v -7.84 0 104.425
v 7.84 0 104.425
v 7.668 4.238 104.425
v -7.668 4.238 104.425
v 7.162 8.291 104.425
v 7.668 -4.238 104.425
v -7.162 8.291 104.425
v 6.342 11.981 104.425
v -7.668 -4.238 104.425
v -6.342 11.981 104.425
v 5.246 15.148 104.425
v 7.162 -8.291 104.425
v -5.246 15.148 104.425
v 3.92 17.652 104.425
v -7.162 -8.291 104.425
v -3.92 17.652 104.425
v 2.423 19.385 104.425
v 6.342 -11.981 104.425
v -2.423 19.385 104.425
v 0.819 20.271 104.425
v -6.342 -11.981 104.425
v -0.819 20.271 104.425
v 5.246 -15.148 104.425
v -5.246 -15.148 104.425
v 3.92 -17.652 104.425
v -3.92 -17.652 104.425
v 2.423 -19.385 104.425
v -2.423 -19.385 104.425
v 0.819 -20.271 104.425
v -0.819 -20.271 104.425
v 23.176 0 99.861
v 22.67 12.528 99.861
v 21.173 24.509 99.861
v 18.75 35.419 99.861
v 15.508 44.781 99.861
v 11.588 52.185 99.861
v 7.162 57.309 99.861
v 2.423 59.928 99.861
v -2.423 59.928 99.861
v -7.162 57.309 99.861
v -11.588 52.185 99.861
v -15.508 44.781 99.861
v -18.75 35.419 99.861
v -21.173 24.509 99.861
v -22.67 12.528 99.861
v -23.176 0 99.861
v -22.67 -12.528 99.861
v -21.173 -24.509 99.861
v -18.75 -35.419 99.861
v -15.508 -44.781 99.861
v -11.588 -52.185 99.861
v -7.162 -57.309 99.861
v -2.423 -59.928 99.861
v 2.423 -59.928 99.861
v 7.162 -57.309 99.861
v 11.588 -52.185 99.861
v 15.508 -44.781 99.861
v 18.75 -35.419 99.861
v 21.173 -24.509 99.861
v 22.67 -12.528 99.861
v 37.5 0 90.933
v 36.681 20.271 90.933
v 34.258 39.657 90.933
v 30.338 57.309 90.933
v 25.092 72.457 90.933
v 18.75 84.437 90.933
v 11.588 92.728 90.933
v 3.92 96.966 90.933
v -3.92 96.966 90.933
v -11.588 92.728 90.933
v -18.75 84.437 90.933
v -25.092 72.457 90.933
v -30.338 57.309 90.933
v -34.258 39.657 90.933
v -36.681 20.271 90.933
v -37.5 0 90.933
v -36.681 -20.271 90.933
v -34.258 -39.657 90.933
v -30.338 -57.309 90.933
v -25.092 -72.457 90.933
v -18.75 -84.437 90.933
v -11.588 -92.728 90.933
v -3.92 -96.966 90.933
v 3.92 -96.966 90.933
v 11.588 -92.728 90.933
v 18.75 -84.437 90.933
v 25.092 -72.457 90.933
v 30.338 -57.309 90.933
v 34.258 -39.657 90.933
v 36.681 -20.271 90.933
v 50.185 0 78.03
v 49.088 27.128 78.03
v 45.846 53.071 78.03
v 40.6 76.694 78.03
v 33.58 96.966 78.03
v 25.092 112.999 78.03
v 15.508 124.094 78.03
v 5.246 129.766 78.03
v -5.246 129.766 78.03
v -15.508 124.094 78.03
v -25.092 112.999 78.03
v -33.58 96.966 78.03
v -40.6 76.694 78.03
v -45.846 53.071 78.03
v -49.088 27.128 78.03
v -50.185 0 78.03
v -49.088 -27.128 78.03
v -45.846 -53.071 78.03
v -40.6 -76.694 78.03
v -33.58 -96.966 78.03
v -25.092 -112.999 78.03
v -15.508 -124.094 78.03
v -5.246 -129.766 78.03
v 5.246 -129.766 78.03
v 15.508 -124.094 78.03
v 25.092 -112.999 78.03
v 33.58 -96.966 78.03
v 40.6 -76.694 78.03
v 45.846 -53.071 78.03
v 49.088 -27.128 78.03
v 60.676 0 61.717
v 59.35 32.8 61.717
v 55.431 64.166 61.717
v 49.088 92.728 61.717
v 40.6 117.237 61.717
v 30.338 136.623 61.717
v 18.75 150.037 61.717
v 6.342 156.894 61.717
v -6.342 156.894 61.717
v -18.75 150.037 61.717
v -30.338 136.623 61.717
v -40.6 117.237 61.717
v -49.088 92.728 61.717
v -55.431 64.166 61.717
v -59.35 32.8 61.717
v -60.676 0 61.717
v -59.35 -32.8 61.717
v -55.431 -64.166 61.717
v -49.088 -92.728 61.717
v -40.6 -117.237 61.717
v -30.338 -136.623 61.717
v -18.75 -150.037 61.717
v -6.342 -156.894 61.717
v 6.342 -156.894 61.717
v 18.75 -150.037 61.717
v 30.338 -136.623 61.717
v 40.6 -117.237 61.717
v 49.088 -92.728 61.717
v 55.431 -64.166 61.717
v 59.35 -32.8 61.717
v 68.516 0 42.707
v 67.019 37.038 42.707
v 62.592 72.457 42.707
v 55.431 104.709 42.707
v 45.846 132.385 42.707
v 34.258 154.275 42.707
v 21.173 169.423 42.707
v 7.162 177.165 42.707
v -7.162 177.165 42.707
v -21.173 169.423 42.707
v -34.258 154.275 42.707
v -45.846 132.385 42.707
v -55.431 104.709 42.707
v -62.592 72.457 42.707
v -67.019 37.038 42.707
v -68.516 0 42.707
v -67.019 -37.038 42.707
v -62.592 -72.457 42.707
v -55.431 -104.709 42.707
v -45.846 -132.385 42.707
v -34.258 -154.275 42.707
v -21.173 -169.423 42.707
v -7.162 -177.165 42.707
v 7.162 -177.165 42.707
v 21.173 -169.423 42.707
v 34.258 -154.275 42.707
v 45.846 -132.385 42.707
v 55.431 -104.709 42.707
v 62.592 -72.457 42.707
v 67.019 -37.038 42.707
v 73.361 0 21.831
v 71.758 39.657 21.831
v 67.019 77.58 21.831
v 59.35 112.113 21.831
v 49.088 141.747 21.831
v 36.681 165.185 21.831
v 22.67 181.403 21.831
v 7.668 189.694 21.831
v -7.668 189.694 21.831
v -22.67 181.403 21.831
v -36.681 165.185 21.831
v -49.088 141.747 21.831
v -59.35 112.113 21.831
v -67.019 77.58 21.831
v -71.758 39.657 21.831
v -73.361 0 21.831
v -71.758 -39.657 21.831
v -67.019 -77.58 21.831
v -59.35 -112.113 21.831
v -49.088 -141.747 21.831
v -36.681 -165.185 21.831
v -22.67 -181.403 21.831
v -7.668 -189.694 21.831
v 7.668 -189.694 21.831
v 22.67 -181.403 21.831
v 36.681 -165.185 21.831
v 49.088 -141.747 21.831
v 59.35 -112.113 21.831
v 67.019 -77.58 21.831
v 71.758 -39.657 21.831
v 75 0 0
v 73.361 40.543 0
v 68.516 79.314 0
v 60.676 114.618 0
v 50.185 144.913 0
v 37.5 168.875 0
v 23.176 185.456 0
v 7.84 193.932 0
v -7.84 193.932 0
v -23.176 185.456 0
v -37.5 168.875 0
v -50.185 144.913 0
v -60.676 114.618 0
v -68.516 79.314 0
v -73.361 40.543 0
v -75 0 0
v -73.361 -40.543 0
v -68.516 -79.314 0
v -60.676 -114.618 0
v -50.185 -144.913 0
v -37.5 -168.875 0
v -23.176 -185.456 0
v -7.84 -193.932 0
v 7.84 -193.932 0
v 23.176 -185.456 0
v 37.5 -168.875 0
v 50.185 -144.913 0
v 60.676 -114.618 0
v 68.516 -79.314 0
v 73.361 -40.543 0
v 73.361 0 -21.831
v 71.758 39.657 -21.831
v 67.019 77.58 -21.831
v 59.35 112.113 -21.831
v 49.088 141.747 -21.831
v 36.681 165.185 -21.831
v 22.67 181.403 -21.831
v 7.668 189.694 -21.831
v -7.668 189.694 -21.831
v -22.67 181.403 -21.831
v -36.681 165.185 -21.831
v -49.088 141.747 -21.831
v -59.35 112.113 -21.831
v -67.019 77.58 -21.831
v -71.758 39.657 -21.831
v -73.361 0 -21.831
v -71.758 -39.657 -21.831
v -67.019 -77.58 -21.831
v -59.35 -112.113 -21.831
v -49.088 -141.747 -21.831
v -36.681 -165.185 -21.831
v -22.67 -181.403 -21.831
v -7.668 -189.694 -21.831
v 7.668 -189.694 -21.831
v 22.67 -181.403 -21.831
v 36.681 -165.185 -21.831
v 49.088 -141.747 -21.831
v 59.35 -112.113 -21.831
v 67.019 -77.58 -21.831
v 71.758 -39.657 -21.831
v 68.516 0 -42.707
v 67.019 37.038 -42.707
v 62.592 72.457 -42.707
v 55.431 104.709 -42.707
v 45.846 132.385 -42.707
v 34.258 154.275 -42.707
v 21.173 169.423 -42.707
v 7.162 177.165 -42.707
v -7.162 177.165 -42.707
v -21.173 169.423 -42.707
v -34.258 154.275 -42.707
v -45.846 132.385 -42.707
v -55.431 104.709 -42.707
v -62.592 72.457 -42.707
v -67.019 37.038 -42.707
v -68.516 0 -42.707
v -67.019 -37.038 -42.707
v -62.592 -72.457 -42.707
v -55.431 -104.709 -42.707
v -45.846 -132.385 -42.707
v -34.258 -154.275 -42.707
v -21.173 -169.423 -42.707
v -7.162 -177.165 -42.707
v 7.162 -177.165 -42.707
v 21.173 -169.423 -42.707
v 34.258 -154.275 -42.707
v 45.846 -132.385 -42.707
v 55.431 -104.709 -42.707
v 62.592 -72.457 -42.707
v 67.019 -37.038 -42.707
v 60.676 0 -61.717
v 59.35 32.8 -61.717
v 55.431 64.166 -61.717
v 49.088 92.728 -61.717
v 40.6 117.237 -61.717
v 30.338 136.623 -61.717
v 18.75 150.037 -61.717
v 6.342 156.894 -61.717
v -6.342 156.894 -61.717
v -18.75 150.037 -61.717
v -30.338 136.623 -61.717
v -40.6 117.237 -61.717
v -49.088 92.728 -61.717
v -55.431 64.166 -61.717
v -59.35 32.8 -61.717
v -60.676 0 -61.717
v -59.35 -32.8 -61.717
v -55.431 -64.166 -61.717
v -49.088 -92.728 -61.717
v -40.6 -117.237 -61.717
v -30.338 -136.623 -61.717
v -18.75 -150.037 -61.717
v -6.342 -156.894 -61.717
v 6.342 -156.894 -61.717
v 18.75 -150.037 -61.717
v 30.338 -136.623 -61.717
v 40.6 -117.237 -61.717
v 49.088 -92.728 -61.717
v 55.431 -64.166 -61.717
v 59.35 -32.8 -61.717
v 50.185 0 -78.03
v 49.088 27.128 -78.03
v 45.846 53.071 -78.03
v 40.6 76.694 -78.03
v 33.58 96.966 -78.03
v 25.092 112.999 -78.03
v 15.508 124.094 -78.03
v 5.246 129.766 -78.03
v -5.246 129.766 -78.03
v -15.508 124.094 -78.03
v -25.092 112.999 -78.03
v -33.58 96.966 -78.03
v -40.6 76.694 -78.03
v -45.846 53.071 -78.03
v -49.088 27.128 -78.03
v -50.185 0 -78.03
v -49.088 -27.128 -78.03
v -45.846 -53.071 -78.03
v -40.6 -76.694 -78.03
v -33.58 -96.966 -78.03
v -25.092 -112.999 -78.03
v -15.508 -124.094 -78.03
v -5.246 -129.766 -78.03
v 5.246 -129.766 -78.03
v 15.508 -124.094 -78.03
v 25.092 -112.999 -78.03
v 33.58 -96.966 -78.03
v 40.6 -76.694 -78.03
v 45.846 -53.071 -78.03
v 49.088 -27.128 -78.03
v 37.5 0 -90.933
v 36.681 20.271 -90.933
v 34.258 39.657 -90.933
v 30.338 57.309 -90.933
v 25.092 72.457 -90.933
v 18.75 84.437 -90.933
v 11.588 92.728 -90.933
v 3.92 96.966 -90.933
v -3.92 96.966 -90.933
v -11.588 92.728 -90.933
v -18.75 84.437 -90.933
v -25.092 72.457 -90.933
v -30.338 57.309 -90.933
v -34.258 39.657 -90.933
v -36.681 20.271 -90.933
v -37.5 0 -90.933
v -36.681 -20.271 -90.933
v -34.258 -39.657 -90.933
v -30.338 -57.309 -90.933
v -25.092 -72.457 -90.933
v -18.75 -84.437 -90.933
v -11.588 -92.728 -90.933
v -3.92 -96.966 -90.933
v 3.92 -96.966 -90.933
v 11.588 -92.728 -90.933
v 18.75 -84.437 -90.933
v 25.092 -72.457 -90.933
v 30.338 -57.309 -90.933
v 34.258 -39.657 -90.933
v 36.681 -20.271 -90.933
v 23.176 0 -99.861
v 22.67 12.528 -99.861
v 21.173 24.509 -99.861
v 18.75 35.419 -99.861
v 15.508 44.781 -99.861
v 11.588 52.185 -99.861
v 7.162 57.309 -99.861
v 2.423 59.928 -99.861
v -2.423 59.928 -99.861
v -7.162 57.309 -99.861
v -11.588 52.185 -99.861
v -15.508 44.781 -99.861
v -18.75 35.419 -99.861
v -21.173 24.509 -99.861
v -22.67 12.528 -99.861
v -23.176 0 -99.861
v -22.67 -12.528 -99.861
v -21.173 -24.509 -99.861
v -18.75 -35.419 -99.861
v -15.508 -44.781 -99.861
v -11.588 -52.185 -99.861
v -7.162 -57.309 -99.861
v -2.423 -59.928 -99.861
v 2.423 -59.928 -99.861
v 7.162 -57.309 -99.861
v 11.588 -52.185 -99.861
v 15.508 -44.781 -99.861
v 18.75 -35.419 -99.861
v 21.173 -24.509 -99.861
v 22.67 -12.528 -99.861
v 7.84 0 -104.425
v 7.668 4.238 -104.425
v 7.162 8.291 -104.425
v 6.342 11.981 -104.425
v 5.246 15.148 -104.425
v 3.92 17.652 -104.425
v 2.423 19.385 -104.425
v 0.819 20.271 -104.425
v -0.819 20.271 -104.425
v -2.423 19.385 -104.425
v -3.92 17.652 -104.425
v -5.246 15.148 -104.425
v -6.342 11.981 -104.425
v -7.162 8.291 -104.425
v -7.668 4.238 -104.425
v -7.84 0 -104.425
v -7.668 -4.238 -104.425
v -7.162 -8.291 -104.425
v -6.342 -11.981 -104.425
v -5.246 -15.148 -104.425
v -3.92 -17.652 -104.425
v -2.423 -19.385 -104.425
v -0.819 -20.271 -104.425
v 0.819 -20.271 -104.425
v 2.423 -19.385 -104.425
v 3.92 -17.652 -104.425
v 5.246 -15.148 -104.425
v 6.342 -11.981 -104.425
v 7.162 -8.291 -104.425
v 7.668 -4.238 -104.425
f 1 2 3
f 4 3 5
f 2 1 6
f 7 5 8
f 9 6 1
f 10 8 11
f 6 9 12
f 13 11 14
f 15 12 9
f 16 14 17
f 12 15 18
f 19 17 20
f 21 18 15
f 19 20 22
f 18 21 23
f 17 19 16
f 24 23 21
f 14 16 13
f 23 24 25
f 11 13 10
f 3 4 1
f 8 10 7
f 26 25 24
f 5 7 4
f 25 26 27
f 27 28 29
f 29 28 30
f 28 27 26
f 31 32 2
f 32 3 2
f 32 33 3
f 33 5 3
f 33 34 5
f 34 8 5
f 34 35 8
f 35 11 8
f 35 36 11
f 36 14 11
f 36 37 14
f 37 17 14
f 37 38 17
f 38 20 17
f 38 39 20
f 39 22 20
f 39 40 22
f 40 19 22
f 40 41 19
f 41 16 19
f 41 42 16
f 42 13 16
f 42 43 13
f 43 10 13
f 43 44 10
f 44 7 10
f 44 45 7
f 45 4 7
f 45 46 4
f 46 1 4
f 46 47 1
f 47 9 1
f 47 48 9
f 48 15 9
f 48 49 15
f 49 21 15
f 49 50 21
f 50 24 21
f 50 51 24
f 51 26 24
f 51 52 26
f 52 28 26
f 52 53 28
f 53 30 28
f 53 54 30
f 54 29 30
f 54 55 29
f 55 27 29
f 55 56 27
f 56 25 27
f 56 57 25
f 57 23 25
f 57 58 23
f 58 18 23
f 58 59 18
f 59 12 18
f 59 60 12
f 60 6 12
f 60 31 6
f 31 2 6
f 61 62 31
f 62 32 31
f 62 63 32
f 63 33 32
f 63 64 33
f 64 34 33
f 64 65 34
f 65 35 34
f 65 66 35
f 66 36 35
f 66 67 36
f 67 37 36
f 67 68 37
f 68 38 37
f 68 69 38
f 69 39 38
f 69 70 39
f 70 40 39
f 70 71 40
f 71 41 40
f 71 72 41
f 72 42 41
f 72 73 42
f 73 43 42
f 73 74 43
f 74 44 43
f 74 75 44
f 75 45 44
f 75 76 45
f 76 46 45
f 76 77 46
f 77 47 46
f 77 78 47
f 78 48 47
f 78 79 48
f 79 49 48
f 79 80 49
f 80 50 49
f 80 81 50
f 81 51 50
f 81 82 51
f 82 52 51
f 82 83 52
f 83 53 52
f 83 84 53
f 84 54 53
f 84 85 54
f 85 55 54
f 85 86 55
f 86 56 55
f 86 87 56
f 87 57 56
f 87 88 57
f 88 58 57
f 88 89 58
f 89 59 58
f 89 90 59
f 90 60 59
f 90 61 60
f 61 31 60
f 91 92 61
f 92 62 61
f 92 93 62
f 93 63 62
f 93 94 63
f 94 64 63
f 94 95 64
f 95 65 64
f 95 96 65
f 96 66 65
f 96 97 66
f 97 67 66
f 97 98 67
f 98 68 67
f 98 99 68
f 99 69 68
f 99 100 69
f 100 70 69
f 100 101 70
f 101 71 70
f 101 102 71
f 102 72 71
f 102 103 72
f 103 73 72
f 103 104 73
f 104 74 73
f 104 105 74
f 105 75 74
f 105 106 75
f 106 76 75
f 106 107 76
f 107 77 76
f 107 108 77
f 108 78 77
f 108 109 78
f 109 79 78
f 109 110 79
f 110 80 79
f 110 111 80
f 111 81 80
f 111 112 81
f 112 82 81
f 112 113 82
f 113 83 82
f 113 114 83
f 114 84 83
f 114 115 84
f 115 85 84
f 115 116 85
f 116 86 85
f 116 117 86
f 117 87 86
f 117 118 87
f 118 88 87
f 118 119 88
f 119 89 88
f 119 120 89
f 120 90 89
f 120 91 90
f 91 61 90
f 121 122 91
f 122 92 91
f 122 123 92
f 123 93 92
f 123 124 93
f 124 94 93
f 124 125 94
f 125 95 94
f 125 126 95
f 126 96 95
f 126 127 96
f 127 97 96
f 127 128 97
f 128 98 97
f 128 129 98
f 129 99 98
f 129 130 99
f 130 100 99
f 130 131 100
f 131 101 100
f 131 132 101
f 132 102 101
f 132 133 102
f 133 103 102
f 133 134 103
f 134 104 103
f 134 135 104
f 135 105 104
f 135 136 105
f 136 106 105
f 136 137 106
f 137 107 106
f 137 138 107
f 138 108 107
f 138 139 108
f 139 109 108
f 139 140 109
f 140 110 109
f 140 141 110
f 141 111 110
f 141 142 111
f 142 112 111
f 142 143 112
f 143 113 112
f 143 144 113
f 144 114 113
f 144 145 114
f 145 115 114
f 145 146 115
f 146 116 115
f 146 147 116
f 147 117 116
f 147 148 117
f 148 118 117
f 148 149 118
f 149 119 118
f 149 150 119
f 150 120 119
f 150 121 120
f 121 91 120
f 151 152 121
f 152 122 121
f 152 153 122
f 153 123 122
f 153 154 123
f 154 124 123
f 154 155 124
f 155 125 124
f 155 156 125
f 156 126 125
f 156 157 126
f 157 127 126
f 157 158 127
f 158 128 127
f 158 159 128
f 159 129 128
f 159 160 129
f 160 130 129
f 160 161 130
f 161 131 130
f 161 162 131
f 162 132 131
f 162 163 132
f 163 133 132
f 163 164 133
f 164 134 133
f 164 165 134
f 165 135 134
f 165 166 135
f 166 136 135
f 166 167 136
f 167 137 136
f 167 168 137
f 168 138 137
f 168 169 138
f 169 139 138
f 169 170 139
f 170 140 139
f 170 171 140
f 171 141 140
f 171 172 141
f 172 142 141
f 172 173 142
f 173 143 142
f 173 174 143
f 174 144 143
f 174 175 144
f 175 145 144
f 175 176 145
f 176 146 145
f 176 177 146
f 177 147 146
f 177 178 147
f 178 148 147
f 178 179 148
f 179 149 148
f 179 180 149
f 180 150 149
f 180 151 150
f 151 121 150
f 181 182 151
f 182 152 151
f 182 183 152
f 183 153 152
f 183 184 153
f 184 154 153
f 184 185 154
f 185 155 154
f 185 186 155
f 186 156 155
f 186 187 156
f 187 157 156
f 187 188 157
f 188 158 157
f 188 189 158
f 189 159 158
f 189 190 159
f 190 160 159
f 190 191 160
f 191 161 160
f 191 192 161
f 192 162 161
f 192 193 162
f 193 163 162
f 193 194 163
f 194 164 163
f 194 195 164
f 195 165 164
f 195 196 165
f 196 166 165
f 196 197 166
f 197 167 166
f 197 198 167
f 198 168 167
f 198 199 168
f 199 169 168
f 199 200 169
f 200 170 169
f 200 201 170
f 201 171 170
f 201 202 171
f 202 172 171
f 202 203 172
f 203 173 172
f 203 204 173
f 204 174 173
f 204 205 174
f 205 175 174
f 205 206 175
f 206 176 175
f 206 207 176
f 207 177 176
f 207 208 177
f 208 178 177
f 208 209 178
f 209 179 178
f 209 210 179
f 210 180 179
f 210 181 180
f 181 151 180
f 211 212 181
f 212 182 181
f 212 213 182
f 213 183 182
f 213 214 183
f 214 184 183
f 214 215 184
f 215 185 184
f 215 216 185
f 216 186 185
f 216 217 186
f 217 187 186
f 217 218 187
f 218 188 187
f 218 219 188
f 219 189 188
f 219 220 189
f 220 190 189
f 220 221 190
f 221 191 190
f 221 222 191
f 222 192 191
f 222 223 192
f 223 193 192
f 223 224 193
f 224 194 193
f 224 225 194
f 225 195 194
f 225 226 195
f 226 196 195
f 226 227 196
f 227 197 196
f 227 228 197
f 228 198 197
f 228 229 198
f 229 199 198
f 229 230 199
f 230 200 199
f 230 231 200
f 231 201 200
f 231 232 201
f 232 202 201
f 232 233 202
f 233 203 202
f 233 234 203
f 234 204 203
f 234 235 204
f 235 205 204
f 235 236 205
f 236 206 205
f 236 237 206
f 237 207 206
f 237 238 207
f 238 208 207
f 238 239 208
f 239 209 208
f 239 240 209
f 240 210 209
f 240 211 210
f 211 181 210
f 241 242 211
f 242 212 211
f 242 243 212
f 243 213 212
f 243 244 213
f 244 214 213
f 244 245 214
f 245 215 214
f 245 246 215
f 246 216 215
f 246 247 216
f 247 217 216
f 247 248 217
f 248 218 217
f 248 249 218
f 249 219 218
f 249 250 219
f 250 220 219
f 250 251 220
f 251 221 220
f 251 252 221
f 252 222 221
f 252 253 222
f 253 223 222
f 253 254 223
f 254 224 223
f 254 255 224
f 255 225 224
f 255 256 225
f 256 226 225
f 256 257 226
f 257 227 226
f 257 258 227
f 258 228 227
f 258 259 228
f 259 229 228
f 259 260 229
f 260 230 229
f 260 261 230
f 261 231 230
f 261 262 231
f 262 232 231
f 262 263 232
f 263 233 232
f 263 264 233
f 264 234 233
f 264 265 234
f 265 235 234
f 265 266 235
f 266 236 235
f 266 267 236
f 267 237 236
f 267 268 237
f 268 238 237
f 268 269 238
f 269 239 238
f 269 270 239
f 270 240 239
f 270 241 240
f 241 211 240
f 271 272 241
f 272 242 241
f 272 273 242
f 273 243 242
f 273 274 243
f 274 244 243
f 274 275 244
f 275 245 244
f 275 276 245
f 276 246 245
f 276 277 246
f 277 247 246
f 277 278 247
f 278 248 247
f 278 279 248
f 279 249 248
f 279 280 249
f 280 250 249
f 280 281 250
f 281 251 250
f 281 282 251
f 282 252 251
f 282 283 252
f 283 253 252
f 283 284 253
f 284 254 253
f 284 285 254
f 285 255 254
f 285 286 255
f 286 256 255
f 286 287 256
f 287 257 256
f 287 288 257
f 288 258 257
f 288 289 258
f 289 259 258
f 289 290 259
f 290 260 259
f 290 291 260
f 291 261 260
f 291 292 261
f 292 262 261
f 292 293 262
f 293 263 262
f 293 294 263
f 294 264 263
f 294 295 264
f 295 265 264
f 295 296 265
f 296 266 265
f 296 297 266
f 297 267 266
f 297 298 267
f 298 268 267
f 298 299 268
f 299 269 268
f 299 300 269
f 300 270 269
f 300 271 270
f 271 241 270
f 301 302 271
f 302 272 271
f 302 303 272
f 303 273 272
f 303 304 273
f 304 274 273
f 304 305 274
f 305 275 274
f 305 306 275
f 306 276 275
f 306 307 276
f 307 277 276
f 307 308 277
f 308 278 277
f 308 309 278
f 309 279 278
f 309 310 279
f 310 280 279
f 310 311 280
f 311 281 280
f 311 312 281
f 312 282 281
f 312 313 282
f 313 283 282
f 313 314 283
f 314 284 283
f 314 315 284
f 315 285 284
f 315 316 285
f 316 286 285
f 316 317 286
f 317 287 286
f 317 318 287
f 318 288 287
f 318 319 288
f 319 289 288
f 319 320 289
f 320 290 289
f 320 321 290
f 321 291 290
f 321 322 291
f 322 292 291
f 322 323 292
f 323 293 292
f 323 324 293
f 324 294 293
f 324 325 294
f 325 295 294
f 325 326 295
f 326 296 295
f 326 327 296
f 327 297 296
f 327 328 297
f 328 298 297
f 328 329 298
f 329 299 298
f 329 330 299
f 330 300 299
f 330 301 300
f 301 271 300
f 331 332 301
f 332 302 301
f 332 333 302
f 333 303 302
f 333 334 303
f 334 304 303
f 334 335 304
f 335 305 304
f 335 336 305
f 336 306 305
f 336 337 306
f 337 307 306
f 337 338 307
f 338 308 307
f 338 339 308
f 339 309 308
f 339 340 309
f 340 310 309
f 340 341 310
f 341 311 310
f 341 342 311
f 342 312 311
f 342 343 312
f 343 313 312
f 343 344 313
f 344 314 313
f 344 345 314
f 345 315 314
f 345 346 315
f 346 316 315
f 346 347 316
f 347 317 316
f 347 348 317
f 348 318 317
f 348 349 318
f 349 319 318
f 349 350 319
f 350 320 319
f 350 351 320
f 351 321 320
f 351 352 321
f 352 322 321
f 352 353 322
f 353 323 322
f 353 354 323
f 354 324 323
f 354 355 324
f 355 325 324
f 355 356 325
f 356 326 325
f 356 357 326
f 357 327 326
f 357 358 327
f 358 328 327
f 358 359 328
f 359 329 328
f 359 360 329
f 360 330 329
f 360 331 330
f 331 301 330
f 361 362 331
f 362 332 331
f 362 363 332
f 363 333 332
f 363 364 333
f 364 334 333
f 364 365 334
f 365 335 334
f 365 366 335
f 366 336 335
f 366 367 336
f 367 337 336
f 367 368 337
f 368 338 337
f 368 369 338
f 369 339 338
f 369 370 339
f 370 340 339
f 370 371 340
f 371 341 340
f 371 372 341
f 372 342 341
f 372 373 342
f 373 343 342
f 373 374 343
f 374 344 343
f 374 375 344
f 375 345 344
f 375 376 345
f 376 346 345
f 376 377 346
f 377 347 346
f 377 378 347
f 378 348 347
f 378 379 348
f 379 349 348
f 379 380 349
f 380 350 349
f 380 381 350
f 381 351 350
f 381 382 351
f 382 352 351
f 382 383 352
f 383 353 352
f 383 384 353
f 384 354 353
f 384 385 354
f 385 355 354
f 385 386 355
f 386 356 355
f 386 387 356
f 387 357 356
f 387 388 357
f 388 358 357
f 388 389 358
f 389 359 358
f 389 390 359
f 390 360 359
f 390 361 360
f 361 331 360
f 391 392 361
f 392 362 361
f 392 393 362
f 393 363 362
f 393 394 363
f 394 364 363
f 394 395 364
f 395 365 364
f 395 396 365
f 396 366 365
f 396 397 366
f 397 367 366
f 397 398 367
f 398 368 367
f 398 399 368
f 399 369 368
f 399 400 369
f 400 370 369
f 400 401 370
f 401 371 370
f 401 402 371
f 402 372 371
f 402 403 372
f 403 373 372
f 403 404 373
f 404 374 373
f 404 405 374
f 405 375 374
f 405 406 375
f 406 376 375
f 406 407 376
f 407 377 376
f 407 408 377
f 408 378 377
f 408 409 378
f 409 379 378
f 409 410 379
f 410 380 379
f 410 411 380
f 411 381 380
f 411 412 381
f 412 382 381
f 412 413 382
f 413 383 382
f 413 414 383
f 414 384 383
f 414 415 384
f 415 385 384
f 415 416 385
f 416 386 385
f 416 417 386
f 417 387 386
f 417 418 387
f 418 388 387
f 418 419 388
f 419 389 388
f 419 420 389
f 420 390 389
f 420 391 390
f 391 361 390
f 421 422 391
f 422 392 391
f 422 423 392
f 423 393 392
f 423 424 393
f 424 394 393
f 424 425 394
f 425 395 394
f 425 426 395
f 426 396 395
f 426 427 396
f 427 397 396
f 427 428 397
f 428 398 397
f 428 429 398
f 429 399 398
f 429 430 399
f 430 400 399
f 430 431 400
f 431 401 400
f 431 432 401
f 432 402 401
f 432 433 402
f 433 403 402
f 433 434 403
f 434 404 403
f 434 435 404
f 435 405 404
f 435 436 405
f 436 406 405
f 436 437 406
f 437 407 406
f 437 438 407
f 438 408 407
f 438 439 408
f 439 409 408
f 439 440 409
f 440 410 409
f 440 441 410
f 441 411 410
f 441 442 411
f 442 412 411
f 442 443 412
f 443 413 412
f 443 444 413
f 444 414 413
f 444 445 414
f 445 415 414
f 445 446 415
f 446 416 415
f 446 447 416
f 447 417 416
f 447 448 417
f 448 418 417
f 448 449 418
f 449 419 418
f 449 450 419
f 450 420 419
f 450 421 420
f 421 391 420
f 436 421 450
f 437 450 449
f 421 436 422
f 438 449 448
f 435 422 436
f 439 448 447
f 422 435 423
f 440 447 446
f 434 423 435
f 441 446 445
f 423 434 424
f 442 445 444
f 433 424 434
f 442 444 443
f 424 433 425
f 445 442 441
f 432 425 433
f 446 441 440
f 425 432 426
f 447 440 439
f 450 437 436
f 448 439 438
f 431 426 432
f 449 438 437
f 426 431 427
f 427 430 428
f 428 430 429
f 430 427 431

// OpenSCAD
// Generated by SolidPython 1.0.1 on 2020-07-29 00:46:46


scale(v = [5, 13, 7]) {
	sphere(r = 15);
}
/***********************************************
*********      SolidPython code:      **********
************************************************
 
# import packages: SolidPython
from solid import *
from solid.utils import *
from itertools import chain, combinations, permutations


class Resize:

    def __init__(self, scad_file):
        self.scad_file = scad_file
        #self.scad_file = import_scad(scad_file)
        # cone/cylinder param:
        self.r1 = 0
        self.r2 = 0
        self.h = 0
        # rectangular prism param:
        self.w = 0
        self.l = 0
        # ellipse param:
        self.r = 0

    # import OpenScad code (file name corresponds to shape)


    # classify shape + parameters
    def assign(self, param1, param2, param3):
        if self.scad_file == 'cone.scad':
            self.r1 = param1
            self.r2 = param2
            self.h = param3
        elif self.scad_file == 'cylinder.scad':
            self.r1 = param1
            self.r2 = param2
            self.h = param3
        elif self.scad_file == 'rectangularPrism.scad':
            self.h = param1
            self.l = param2
            self.w = param3
        else:
            self.r = param1
            self.h = param2

    # resize parameters
    def iterate(self):
        x = range(3, 20, 2)
        i = 1
        if self.scad_file == 'cone.scad':
            tempList = list(permutations(x, 2))
            for temp in tempList:
                param1 = temp[0]
                param2 = temp[1]
                filepath = 'produced_scad_files/' + 'cone' + str(param1) + '_' + str(param2) + '_' + '.scad'
                scad_render_to_file(cylinder(h=param1, r1=param2, r2=0), filepath)

        elif self.scad_file == 'cylinder.scad':
            tempList = list(permutations(x, 3))
            for temp in tempList:
                param1 = temp[0]
                param2 = temp[1]
                filepath = 'produced_scad_files/' + 'cylinder' + str(param1) + '_' + str(param2) + '_' + '.scad'
                scad_render_to_file(cylinder(h=param1, r1=param2, r2=param2), filepath)

        elif self.scad_file == 'rectangularPrism.scad':
            tempList = list(permutations(x, 3))
            for temp in tempList:
                param1 = temp[0]
                param2 = temp[1]
                param3 = temp[2]
                filepath = 'produced_scad_files/' + 'rectangularPrism' + str(param1) + '_' + str(param2) + '_' + str(
                    param3) + '.scad'
                scad_render_to_file(cube(size=(param1, param2, param3)), filepath)

        elif self.scad_file == 'ellipse.scad':
            tempList = list(permutations(x, 4))
            for temp in tempList:
                param1 = temp[0]
                param2 = temp[1]
                param3 = temp[2]
                param4 = temp[3]
                filepath = 'produced_scad_files/' + 'ellipse' + str(param1) + '_' + str(param2) + '_' + str(param3) + '_' + str(param4) + '.scad'
                scad_render_to_file(scale([param1, param2, param3])(sphere(r=param4)), filepath)

    def render_to_scadfile(self):
        scad_render_to_file(scad, 'example.scad') 
 
************************************************/
